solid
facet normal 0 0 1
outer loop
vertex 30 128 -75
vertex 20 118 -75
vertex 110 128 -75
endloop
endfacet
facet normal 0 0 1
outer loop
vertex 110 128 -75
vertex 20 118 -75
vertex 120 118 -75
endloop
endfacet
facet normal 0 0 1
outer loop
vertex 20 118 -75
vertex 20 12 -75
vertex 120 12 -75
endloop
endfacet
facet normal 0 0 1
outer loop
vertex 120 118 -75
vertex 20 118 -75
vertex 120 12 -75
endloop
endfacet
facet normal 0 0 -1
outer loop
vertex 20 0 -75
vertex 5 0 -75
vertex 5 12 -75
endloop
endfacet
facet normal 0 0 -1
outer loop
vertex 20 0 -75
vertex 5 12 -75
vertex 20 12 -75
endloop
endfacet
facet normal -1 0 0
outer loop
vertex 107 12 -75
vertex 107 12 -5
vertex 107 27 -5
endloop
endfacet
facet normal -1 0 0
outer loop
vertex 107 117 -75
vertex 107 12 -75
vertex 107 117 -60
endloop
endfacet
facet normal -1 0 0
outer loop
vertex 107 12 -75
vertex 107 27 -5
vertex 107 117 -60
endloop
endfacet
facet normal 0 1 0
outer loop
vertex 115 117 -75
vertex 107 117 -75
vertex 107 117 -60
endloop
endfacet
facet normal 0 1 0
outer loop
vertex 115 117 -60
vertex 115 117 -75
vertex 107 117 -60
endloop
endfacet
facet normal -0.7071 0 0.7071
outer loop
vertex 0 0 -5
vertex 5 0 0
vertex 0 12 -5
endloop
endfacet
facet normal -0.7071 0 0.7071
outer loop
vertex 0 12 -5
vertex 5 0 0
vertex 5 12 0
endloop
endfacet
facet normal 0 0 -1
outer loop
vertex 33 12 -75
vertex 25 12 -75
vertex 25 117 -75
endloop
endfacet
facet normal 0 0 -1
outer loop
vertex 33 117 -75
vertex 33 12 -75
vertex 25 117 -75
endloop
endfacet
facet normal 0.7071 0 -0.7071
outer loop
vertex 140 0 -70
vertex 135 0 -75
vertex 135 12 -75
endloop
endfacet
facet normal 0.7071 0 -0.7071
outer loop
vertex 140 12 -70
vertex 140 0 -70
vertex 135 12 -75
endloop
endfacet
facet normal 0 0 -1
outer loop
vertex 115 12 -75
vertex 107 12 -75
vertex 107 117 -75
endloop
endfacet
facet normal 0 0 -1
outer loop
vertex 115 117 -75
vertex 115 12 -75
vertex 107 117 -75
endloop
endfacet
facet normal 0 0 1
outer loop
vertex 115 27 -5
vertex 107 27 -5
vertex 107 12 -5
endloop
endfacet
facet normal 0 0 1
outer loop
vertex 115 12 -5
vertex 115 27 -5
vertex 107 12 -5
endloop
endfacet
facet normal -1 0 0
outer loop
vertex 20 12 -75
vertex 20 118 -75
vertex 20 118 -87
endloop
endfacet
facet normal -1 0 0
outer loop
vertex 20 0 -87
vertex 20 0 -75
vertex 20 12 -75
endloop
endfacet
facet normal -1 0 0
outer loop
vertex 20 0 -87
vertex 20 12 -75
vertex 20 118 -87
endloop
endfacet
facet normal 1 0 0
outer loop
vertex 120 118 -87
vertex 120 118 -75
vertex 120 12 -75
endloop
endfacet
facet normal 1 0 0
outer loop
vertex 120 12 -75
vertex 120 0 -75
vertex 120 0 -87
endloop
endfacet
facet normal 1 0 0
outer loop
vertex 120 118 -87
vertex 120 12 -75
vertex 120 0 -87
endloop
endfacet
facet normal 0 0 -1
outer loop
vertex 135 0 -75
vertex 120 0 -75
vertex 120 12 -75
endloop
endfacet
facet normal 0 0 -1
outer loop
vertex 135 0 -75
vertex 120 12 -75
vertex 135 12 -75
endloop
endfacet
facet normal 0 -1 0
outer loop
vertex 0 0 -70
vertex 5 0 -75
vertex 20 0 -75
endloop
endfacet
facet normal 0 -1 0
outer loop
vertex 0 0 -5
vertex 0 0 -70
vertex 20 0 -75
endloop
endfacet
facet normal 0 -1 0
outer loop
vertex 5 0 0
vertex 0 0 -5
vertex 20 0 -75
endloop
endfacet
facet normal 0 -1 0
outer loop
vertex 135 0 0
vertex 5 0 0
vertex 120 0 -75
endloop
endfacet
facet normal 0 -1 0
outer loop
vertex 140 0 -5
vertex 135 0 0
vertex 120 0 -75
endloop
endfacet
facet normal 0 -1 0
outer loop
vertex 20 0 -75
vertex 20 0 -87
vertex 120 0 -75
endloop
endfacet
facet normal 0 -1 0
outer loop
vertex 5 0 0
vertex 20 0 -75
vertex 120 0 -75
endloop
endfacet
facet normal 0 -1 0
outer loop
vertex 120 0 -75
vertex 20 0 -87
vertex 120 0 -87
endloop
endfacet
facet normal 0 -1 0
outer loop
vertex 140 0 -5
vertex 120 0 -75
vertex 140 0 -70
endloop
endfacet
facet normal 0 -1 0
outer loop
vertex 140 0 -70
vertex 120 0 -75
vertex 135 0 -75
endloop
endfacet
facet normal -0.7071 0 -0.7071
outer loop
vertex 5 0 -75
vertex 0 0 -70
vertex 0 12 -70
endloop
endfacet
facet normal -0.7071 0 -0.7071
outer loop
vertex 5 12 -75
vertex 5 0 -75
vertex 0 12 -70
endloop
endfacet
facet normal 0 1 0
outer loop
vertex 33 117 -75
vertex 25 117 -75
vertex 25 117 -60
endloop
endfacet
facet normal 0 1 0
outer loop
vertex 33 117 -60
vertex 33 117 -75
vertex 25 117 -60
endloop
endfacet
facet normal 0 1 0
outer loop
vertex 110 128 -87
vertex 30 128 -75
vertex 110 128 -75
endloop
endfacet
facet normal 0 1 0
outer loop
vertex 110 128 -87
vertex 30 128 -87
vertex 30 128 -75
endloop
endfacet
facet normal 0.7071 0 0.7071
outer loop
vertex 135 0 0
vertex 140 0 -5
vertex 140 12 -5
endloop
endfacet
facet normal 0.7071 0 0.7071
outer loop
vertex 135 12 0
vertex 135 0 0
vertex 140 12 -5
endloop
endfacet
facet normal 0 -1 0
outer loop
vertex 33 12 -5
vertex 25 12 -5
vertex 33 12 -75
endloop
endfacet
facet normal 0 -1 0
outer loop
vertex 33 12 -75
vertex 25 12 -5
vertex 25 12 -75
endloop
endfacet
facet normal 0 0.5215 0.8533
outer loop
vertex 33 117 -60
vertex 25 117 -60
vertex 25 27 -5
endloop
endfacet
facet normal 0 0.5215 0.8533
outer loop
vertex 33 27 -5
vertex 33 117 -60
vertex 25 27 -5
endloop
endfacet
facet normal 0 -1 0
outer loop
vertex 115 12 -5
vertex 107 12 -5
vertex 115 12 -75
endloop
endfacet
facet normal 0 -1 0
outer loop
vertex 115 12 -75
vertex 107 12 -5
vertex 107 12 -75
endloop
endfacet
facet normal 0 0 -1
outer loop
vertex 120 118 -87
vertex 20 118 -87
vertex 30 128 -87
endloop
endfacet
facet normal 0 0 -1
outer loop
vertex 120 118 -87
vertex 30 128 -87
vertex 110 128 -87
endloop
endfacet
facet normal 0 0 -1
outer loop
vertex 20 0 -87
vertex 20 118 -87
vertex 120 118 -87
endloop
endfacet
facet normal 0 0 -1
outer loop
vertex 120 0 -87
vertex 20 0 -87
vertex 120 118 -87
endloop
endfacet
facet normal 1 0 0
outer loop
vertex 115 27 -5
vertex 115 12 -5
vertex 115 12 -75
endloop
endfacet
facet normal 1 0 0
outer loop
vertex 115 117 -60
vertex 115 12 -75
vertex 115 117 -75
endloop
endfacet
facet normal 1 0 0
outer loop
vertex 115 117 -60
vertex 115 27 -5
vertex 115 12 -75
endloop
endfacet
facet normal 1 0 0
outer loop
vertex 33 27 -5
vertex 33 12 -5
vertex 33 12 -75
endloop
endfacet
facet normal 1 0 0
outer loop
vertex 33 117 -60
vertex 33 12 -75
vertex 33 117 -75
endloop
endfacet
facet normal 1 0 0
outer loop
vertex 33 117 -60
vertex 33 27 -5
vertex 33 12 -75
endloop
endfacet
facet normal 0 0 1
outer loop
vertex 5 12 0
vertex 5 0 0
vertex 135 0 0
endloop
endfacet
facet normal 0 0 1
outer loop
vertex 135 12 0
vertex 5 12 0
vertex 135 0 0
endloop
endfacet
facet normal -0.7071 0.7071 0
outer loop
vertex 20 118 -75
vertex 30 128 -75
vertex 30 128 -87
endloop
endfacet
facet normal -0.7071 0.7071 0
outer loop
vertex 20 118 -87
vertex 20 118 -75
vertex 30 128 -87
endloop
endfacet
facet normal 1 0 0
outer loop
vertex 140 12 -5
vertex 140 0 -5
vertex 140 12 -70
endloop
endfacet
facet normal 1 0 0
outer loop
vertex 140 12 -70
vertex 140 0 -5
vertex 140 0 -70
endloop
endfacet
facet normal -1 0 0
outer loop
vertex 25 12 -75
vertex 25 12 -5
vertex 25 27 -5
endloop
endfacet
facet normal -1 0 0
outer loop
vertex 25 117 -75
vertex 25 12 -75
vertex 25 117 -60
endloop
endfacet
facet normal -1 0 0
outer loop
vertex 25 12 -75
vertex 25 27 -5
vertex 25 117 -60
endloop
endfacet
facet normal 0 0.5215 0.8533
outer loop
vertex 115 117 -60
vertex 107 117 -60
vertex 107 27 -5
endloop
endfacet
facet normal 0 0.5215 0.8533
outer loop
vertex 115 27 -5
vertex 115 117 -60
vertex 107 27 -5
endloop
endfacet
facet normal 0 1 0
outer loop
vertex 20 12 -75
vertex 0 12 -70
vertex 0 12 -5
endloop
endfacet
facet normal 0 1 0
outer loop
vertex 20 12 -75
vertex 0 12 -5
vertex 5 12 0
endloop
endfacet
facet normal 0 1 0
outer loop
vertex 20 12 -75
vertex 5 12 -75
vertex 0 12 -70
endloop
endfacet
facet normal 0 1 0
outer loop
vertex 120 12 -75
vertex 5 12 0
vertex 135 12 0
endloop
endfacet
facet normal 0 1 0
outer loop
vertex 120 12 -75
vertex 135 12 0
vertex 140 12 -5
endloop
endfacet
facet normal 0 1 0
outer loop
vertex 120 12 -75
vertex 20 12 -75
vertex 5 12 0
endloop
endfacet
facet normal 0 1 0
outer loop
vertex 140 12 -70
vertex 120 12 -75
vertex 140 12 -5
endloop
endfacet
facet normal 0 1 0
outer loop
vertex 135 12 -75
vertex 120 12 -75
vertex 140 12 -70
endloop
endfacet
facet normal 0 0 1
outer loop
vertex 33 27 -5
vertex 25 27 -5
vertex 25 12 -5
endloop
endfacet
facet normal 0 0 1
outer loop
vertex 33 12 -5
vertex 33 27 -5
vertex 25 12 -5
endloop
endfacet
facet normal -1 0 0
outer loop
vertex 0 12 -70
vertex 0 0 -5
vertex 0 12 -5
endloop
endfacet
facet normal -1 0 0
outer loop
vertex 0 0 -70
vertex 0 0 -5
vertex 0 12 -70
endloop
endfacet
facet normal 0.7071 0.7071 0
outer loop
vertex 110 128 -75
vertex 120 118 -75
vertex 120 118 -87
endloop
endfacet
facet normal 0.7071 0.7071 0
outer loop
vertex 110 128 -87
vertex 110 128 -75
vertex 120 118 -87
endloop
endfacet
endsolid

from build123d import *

# Parameters (mm, degrees)
SKETCH1_W           = 140
SKETCH1_H           = 75
BOSS_EXTRUDE4_DEPTH = 12
SKETCH5_W           = 100
SKETCH5_H           = 12
BOSS_EXTRUDE5_DEPTH = 128
GUSSET1_START       = 107
GUSSET1_DEPTH       = 8
GUSSET2_START       = 25
GUSSET2_DEPTH       = 8
CHAMFER1_SIZE       = 10
CHAMFER2_SIZE       = 5


# Read off the part's stored shape, not the designer's step: Gusset1, Gusset2
with BuildPart() as part:
    # Sketch1 → Boss-Extrude4 (new body)
    with BuildSketch(Plane(origin=(0, 0, 0), x_dir=(1, 0, 0), z_dir=(0, 1, 0))):
        with Locations((70, 37.5)):
            Rectangle(SKETCH1_W, SKETCH1_H)
    extrude(amount=BOSS_EXTRUDE4_DEPTH)

    # Sketch5 → Boss-Extrude5 (add)
    with BuildSketch(Plane(origin=(0, 0, 0), x_dir=(1, 0, 0), z_dir=(0, 1, 0))):
        with Locations((70, 81)):
            Rectangle(SKETCH5_W, SKETCH5_H)
    extrude(amount=BOSS_EXTRUDE5_DEPTH)

    # Chamfer1
    chamfer1_edges = [part.edges().sort_by_distance(p)[0] for p in [
        (20, 128, -81),
        (120, 128, -81),
    ]]
    chamfer(chamfer1_edges, length=CHAMFER1_SIZE)

    # Chamfer2
    chamfer2_edges = [part.edges().sort_by_distance(p)[0] for p in [
        (0, 6, -75),
        (140, 6, -75),
        (140, 6, 0),
        (0, 6, 0),
    ]]
    chamfer(chamfer2_edges, length=CHAMFER2_SIZE)


with BuildPart() as body_2:
    # Gusset1 outline → Gusset1 (new body)
    with BuildSketch(Plane.YZ.offset(GUSSET1_START)):
        Polygon((117, -75), (117, -60), (27, -5), (12, -5), (12, -75), align=None)
    extrude(amount=GUSSET1_DEPTH)


with BuildPart() as body_3:
    # Gusset2 outline → Gusset2 (new body)
    with BuildSketch(Plane.YZ.offset(GUSSET2_START)):
        Polygon((117, -75), (117, -60), (27, -5), (12, -5), (12, -75), align=None)
    extrude(amount=GUSSET2_DEPTH)


solid = Compound([part.part, body_2.part, body_3.part])
